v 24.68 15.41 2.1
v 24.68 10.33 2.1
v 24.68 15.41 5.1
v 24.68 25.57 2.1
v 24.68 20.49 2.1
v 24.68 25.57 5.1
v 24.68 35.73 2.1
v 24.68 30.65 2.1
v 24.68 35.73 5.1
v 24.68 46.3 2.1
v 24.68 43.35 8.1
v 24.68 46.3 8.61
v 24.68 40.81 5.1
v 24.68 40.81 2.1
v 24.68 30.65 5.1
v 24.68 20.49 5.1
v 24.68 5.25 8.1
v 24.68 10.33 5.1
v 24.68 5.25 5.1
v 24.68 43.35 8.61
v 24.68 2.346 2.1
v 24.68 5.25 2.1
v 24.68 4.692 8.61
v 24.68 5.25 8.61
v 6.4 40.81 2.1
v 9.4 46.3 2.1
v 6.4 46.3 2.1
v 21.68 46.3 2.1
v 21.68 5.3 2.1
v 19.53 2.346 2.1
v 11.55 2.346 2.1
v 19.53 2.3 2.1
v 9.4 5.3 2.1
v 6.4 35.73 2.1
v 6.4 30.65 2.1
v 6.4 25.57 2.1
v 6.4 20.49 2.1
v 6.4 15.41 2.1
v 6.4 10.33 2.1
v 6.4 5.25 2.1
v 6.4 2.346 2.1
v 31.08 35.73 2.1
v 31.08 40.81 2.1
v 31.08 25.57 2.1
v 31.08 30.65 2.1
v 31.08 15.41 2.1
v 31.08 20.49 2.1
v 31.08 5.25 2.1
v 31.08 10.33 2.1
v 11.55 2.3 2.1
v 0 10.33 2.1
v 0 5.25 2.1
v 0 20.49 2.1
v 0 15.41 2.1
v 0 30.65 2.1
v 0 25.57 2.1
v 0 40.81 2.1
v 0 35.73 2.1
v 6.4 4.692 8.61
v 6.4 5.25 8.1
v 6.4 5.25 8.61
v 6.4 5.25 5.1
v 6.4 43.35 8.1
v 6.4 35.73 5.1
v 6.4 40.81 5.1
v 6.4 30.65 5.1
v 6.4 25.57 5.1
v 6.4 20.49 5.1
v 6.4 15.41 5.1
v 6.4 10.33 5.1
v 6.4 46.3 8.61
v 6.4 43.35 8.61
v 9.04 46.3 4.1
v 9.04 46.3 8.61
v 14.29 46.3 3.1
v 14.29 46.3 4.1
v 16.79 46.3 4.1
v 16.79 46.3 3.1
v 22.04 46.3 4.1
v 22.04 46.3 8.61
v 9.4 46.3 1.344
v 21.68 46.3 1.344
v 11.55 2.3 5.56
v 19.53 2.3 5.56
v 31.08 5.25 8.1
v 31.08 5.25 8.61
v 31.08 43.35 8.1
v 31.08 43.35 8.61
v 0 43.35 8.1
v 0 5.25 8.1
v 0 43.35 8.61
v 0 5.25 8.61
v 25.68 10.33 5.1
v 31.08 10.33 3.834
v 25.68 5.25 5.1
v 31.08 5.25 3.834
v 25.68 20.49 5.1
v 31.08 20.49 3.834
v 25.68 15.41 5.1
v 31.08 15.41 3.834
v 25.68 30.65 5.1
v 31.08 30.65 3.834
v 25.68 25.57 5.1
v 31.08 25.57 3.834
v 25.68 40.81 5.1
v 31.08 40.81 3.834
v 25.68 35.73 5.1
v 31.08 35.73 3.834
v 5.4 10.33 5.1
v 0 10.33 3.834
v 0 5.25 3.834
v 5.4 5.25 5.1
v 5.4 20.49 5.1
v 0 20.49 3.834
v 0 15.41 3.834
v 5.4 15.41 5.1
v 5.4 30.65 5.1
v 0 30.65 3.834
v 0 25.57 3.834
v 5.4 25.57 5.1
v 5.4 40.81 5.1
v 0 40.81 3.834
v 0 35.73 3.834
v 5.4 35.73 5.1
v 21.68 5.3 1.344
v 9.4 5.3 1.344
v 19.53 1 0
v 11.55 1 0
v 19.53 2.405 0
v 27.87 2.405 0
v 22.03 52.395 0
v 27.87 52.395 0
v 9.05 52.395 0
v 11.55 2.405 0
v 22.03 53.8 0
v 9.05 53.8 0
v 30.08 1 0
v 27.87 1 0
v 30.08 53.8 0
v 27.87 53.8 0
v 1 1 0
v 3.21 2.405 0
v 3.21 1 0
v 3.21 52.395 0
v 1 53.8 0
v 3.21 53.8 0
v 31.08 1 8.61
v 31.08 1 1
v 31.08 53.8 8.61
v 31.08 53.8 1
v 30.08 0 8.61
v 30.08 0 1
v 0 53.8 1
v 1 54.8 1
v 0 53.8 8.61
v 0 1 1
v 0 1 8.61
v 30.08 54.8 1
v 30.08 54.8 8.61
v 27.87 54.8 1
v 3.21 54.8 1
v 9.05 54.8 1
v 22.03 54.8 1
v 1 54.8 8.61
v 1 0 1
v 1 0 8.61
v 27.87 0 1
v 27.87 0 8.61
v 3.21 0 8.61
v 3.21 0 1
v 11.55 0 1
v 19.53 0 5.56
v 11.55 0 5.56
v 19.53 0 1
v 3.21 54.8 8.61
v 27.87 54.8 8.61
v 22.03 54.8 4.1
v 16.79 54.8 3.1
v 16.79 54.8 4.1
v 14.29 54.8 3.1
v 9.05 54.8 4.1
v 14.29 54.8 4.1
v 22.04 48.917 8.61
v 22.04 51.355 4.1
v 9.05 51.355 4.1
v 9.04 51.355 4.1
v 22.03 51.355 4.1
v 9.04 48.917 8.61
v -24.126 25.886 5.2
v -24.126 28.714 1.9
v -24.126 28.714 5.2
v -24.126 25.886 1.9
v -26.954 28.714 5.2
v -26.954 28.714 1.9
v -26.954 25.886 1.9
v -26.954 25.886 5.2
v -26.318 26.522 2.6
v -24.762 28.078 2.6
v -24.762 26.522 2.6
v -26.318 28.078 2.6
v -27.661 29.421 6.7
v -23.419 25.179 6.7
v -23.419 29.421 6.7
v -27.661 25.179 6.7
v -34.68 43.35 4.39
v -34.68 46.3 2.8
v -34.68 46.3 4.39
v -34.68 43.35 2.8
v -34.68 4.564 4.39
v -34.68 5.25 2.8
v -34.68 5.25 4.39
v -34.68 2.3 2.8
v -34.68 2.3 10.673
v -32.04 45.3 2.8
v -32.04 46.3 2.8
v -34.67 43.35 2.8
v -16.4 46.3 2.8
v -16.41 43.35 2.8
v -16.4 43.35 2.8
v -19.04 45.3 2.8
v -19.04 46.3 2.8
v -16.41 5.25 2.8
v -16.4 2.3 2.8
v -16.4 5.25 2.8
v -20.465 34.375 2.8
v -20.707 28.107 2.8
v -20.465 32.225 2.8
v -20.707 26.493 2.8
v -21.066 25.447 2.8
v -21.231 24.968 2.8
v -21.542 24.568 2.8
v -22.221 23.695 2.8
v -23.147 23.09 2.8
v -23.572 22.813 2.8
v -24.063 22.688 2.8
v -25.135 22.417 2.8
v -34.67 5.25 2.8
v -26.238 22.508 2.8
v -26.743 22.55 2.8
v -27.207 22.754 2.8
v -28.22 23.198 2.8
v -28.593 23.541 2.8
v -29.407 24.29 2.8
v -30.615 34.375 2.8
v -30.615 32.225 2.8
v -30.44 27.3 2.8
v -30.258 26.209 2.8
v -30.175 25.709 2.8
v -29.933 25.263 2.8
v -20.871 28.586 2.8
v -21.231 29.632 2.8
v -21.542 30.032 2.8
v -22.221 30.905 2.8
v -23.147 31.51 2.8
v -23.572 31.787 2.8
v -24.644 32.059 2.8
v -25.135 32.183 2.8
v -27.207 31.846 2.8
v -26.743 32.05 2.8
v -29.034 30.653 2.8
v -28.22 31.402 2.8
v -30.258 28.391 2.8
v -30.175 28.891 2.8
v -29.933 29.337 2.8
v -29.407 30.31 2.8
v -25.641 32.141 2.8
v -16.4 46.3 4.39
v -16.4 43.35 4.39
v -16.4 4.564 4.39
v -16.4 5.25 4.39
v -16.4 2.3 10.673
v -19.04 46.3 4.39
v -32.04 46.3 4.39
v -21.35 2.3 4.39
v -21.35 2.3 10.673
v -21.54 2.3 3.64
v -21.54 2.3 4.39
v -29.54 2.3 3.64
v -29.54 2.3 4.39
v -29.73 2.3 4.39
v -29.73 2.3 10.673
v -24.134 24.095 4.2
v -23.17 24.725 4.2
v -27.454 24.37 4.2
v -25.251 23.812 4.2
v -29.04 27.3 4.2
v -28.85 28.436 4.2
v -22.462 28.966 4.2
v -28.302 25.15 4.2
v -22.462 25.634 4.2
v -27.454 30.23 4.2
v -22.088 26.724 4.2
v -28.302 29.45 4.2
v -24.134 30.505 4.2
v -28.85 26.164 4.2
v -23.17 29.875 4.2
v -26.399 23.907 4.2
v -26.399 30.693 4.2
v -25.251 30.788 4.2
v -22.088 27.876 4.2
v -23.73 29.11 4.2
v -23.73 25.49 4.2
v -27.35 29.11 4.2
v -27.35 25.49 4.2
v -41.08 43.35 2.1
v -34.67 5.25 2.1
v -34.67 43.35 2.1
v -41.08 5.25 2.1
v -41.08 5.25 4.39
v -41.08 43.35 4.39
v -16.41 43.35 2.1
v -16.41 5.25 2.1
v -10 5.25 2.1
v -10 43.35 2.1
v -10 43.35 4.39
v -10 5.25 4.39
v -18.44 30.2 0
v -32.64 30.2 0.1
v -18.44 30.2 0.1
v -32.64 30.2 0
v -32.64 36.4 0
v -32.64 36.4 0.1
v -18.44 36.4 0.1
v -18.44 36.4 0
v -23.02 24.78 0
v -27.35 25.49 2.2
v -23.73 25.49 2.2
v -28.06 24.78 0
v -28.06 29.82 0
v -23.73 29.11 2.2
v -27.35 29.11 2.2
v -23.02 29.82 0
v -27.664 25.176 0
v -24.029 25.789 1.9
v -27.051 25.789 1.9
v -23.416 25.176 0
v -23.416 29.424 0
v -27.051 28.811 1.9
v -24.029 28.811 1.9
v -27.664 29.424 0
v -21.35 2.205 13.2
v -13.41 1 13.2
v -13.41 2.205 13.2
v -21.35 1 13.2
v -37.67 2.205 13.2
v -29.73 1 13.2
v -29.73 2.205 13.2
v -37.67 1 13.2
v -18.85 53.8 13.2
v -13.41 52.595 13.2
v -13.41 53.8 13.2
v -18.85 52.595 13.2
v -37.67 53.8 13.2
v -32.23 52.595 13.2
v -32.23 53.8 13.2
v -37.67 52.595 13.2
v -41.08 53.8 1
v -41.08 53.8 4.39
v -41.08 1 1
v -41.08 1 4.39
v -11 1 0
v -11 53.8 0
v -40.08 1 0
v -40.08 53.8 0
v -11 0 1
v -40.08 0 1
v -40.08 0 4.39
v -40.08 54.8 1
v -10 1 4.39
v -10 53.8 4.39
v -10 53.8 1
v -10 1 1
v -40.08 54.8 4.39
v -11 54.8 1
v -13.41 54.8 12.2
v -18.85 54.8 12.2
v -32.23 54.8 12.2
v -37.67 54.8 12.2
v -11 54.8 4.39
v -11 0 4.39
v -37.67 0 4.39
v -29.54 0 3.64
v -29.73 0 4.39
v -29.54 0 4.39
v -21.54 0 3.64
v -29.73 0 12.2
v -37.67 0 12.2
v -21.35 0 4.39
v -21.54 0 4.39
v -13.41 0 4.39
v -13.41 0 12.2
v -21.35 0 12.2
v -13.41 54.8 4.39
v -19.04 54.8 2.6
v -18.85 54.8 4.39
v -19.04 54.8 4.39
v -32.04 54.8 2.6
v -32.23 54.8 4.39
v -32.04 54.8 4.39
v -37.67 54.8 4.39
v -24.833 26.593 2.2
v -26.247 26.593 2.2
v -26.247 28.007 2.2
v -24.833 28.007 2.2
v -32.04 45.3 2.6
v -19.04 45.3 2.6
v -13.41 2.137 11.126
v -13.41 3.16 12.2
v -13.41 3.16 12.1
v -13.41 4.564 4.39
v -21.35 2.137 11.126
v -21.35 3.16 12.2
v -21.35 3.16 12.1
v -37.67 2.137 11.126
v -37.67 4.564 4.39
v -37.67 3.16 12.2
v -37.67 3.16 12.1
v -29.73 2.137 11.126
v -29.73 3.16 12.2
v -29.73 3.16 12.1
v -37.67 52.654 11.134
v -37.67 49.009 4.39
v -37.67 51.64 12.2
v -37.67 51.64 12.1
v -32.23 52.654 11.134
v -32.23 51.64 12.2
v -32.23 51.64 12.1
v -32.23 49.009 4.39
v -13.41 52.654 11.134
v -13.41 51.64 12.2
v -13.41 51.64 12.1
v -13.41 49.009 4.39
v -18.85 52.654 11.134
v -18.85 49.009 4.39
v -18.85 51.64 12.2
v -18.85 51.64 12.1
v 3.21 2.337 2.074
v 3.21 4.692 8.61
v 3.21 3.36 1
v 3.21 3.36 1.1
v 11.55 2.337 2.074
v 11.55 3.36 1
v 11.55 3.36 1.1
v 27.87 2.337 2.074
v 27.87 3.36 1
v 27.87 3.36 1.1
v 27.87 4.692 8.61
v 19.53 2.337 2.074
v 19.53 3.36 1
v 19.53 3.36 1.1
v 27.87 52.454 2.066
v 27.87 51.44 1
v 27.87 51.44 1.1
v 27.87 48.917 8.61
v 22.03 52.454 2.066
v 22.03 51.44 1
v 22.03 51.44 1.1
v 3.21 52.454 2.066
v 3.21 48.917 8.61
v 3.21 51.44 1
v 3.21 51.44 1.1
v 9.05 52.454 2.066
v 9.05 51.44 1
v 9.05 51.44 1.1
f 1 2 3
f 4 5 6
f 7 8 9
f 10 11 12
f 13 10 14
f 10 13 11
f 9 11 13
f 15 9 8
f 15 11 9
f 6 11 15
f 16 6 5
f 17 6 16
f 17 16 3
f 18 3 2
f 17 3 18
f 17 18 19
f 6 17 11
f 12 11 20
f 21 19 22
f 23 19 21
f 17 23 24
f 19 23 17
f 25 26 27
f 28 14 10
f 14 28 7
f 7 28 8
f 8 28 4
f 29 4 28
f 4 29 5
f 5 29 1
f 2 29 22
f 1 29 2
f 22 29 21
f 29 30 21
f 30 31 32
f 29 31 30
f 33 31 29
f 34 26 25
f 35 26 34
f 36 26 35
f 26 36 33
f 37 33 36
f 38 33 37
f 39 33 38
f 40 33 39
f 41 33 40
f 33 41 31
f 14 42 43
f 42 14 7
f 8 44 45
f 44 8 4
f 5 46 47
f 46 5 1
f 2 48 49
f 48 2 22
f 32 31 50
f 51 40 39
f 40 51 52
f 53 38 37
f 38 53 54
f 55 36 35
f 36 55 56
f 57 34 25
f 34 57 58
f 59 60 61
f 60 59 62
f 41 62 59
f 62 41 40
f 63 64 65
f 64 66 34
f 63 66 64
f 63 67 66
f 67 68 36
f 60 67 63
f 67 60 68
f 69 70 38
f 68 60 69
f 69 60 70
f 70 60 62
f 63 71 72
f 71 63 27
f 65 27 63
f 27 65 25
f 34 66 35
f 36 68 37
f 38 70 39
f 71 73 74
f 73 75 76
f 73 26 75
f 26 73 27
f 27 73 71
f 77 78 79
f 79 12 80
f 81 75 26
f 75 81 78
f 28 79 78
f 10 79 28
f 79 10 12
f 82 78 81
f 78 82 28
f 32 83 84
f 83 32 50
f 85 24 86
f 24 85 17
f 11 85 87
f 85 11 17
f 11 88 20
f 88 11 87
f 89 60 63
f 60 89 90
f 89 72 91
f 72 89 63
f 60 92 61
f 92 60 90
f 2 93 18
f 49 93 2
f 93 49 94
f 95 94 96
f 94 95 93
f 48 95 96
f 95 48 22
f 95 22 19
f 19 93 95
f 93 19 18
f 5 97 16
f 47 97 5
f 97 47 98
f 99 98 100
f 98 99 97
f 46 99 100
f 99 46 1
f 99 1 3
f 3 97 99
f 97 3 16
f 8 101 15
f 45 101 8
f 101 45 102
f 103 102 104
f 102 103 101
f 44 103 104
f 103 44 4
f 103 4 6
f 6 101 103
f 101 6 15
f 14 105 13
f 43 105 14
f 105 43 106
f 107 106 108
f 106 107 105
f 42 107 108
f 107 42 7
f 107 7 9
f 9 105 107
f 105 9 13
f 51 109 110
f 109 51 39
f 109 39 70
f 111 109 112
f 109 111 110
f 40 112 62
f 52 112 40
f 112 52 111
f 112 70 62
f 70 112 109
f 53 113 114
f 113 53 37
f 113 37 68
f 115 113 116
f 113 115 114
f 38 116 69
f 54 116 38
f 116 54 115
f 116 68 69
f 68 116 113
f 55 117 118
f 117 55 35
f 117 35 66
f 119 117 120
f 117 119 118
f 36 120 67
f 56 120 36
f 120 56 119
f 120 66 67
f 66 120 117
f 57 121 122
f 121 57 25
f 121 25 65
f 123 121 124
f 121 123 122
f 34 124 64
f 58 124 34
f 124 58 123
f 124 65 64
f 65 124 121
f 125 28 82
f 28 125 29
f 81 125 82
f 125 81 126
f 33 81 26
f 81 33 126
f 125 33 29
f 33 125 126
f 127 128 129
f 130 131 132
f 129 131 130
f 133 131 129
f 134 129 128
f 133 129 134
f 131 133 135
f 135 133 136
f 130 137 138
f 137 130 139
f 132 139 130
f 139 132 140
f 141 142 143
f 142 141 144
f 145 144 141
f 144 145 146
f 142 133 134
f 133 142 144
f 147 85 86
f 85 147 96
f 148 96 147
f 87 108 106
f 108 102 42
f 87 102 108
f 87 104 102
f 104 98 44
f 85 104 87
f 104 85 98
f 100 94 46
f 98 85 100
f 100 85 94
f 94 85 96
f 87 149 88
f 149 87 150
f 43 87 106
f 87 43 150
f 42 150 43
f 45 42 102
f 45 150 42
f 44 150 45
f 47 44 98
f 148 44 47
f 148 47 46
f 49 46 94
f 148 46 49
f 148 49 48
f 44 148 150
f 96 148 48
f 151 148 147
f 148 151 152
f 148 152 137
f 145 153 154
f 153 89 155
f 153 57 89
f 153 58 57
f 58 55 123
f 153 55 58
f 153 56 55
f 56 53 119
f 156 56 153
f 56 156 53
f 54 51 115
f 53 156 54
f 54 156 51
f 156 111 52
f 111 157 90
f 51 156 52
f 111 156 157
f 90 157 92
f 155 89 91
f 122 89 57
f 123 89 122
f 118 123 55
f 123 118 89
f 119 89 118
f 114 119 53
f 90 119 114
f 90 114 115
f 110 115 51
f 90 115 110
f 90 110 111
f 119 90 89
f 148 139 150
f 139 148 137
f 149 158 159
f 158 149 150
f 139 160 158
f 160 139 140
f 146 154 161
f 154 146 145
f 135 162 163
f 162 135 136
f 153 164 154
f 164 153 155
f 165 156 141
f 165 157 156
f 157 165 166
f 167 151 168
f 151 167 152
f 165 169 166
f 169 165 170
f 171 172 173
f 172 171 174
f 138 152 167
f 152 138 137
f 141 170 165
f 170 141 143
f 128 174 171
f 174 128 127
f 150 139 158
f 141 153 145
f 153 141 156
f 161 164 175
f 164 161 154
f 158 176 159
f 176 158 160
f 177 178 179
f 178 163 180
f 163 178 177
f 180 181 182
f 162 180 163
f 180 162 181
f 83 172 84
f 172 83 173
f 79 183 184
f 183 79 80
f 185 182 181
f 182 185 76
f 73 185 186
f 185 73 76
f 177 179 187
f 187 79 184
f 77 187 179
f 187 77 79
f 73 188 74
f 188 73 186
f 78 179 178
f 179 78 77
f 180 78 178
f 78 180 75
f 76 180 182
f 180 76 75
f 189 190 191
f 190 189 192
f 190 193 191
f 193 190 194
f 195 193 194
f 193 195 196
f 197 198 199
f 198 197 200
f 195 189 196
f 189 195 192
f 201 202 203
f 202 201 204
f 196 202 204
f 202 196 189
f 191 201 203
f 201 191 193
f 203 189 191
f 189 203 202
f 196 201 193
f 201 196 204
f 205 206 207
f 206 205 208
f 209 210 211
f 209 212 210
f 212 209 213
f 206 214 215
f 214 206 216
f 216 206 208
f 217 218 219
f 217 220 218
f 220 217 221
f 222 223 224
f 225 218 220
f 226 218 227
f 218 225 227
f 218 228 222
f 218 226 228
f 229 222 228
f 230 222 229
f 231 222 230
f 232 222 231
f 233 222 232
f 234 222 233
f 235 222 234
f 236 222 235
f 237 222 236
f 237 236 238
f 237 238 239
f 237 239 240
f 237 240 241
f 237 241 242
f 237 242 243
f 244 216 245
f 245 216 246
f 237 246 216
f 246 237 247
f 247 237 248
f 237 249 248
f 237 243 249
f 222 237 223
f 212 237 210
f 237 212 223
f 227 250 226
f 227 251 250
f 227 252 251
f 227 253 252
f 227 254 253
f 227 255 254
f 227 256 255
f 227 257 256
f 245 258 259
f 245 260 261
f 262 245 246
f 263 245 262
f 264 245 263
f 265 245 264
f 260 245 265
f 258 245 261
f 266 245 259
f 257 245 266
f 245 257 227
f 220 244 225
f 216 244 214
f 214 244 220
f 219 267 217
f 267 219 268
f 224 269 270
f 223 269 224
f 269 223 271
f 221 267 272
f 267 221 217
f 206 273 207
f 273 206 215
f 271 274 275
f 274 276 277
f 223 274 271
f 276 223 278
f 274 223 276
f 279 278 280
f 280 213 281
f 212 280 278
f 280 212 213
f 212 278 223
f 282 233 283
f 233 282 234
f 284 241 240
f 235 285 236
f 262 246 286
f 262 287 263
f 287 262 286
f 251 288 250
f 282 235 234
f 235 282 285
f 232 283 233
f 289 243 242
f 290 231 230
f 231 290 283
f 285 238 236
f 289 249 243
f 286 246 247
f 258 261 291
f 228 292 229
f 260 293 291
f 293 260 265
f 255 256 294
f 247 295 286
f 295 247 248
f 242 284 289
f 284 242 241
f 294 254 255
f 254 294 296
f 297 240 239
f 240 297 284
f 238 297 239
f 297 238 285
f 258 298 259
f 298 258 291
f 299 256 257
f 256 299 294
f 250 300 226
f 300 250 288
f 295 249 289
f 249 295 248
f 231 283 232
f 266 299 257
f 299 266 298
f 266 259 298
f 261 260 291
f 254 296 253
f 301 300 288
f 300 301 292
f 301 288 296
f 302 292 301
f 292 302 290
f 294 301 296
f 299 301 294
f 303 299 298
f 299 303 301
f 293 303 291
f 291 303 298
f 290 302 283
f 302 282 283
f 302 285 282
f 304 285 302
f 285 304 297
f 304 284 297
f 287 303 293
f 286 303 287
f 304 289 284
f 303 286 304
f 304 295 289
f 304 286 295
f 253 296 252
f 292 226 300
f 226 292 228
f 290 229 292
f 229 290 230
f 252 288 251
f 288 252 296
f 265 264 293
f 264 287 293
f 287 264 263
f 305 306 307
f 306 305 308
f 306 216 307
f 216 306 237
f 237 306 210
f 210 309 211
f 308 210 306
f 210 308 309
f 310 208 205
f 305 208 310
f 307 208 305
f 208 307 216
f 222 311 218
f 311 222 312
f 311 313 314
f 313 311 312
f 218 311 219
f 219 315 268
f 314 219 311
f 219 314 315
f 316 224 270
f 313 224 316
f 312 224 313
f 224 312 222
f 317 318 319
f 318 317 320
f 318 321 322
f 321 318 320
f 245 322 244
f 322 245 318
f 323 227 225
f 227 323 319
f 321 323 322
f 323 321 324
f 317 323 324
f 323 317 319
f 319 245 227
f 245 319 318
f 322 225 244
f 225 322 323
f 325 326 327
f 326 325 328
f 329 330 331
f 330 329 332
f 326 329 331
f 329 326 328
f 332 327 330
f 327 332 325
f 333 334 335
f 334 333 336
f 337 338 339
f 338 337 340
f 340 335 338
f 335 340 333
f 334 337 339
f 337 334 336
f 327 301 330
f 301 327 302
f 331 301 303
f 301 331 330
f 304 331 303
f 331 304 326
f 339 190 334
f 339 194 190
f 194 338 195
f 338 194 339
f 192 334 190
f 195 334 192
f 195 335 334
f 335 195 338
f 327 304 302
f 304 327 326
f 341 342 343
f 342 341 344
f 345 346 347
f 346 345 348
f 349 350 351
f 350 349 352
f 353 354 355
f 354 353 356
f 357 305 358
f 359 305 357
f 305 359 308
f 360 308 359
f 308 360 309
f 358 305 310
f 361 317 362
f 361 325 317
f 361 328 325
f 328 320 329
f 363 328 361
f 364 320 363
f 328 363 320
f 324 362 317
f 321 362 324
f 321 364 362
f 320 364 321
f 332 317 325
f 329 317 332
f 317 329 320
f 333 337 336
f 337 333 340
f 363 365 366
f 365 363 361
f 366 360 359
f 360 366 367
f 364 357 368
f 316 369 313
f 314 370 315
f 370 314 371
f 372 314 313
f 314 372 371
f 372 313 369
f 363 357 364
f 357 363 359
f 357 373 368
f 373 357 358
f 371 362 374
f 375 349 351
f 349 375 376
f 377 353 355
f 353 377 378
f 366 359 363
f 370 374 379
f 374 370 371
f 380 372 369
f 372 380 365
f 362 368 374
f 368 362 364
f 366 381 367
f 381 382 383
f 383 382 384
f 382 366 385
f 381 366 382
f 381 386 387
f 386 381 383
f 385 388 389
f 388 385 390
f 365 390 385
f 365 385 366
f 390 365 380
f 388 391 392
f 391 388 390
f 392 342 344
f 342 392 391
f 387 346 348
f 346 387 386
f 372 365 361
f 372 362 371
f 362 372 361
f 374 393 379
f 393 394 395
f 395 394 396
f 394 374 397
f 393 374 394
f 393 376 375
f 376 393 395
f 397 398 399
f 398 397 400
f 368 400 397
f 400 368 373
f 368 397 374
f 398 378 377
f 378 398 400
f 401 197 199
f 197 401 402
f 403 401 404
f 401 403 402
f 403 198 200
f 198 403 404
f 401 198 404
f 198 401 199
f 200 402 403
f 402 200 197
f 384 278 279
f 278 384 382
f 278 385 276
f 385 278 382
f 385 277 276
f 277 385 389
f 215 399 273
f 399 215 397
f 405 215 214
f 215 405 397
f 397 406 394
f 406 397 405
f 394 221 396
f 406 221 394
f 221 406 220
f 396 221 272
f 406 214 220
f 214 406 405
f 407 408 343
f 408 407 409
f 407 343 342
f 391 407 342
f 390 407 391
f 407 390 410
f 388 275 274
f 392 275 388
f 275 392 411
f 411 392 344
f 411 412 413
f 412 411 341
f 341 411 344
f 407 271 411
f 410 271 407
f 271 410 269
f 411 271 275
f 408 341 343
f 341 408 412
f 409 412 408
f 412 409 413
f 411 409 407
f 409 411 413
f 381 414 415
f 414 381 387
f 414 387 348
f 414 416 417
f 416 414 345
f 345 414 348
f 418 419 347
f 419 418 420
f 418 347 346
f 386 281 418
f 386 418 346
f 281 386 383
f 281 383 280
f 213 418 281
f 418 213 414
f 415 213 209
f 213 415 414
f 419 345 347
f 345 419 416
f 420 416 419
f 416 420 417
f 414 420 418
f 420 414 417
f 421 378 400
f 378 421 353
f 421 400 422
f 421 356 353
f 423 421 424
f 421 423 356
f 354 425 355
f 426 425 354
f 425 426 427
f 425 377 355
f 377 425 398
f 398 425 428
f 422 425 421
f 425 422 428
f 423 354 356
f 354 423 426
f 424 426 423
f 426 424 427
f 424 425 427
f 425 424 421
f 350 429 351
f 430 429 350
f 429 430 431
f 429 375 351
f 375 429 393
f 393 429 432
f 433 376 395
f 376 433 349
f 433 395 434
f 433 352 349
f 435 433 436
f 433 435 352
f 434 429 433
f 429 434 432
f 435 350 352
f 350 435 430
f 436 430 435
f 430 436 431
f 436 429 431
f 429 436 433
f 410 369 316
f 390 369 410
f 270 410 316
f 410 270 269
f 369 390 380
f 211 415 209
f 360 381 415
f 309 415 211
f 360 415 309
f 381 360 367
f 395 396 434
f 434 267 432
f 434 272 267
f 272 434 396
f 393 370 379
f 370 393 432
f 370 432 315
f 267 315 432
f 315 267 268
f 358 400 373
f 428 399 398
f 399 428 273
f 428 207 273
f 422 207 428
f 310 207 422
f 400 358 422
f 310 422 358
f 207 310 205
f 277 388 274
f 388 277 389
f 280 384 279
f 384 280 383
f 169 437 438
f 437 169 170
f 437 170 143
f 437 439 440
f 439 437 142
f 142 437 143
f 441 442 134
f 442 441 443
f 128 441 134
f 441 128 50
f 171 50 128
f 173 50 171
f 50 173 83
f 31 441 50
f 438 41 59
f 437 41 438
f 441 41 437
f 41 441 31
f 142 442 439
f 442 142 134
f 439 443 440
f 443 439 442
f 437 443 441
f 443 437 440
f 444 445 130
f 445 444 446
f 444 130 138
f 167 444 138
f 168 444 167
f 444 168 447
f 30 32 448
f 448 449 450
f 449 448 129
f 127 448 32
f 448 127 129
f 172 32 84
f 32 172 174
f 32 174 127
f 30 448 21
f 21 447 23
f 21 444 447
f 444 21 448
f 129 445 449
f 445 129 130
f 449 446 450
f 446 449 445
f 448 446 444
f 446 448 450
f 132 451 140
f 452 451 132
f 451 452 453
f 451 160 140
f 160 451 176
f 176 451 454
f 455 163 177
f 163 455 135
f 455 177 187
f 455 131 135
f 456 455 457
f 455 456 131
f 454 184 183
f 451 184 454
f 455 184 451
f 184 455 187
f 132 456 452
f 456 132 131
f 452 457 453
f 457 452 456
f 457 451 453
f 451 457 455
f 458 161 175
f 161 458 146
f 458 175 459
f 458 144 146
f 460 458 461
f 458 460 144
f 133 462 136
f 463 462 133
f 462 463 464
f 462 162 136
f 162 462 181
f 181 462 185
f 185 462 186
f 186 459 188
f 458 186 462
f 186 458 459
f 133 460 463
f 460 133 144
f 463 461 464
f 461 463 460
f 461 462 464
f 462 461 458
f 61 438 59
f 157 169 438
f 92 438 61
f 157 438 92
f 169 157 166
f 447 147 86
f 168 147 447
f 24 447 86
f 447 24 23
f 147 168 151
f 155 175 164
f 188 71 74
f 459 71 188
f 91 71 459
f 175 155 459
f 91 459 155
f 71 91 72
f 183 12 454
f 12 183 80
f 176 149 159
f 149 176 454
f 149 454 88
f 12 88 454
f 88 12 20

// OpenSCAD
//////////////////////////////////////////////////////////////////////////////////////
///
///  Pin Protector Shell for Arduino Nano and compatibles
///
///  This project generated a shell around an Arduino Nano or Nano compatible
///  which protects all pins from being exposed to accidental shorting with tools
///  or other metallic objects on the work bench.
///
///  Right angle pin headers mounted on the upper side of the Nano PCB are used 
///  instead of the straight headers normally used. Two 15-pin single row and one
///  3x2-pin double row pin header arrays are needed.  This way, all connections
///  to he Nano are horizontal and are safely "hidden" between the upper and lower part
///  of the shell. 
///
///  The so covered horizontal pin connector increade the surface of the Nano shell,
///  so that there is enough space on the top shell for a sticker which identifies
///  each pin in a nicely readable size.
///
///  The top of the shell has a coutout for the 4 LEDs and has an integrated RESET
///  button which is printed in-situ and held in position by its waisted shape.
///
///  Given that there are several variants of the Nano design which essentially differ
///  slightly in the placement of the LEDs and the RESET button, so their longitudinal
///  position (measured in mm from the USB end of the PCB) is parametrized and can
///  easily adapted when needed. 
///
///  In addition to this SCAD file, there is also a corresponding PostScript file
///  which generates the labels to stick on the top part of the shell.
///  
//////////////////////////////////////////////////////////////////////////////////////
///
///  2015-06-13 Heinz Spiess, Switzerland
///
///  released under Creative Commons - Attribution - Share Alike licence (CC BY-SA)
//////////////////////////////////////////////////////////////////////////////////////

ew = 0.56;
eh = 0.252;

module chamfered_cube(size,d=1){
   hull(){
     translate([d,d,0])cube(size-2*[d,d,0]);
     translate([0,d,d])cube(size-2*[0,d,d]);
     translate([d,0,d])cube(size-2*[d,0,d]);
   }
}


// build a cylinder with chamfered edges
module chamfered_cylinder(r=0,r1=0,r2=0,h=0,d=1){
   hull(){
      translate([0,0,d])cylinder(r1=(r?r:r1),r2=(r>0?r:r2),h=h-2*d);
      cylinder(r1=(r?r:r1)-d,r2=(r>0?r:r2)-d,h=h);
   }
}


module nanoshell(
   W = .7*25.4+0.5,
   L = 44,
   H1 = 6,
   H2 = 3,
   pins = 15,
   wall = [6.4,2.3,2.1],
   all = false,
   ledx = 10, 
   ledy = 30,
   resety = 25,
   resetz = 4.5,
   resetr = 2,
   upper = false,
   lower = false,
   case = false,
   move = true,
   airflow = true,
   eps = -0.2,
){
   usb = [8,9,4];
   isp = [13,8.5,6.5];
   ispk = [2.5,8,7.5];
   Wo = 2*wall[0]+W;
   Ho = 2*wall[2]+H1+H2;
   Lo = wall[1]+L+isp[1];

module case(){
   // reset knob
   translate([Wo/2,wall[1]+resety,Ho-wall[2]-resetz-0.1])rotate(45){
           cylinder(r=resetr,h=2+wall[2],$fn=4);
           cylinder(r2=resetr,r1=resetr+1,h=resetz-1-2,$fn=4);
   }
   difference(){
     // main body
     chamfered_cube([2*wall[0]+W,wall[1]+L+isp[1],2*wall[2]+H1+H2]);
     translate([Wo/2,wall[1]+resety,Ho-wall[2]-2-0.1])rotate(45){
           cylinder(r1=1.5,h=2,$fn=4);
     }
     // main cutout
     difference(){
         translate(wall) cube([W,L,Ho-2*wall[2]-0.7]);
         translate([Wo/2,wall[1]+resety,Ho-wall[2]-2-0.1])
	    cylinder(r1=3.5,r2=6,h=2.5);
     }
     // pin cutout
     translate([Wo/2,0,0])for(sx=[-1,1])scale([sx,1,1])
        translate([-Wo/2-1, wall[1]+L/2-pins/2*2.54,wall[2]+H1])
           cube([wall[0]+1.01,pins*2.54,H2]);

     // lower air flow cutout
     if(airflow){
        // air flow side windows
        translate([Wo/2,0,0])for(sx=[-1,1])scale([sx,1,1])
	   for(p=[0:4:pins-3])
              translate([-Wo/2-1, wall[1]+L/2-(pins/2-p)*2.54,wall[2]])
	         hull(){
                   cube([1,2*2.54,H2/2]);
                   translate([wall[0],0,0])cube([1.01,2*2.54,H2]);
		 }
        // base plate deepening
        translate([wall[0]+3,wall[1]+3,wall[2]-3*eh]) cube([W-6,L-3,wall[2]]);
     } 
     // mini USB cutout
     translate([wall[0]+W/2-usb[0]/2,-1,wall[2]+H1-2.54])
        cube(usb);
     // 3x2pin ISP header main cutout
     translate([wall[0]+W/2-isp[0]/2,wall[1]+L-1,wall[2]+H1-4])
        cube(isp+[0,2,0]);
     // 3x2pin ISP header key cutout
     translate([wall[0]+W/2-ispk[0]/2,wall[1]+L-1,wall[2]+H1-3-2])
        cube(ispk+[0,2,0]);
     // LED cutout
     translate([Wo/2-ledx/2,wall[1]+ledy,Ho-wall[2]-0.1-0.7]){
        translate([0,0,-H1/2])cube([ledx,2,wall[2]+H1/2]);
        hull(){
           cube([ledx,2,.1]);
           translate([-wall[2],-wall[2],wall[2]+0.7])cube([ledx+2*wall[2],2+2*wall[2],.2]);
        }
     }
     // Reset knob
     translate([Wo/2,wall[1]+resety,Ho-wall[2]-0.1])rotate(45){
        difference(){
           cylinder(r1=resetr+ew,r2=resetr+wall[2]/2+ew,h=wall[2]+0.2,$fn=4);
           cylinder(r1=resetr,r2=resetr+wall[2]/2,h=wall[2]+0.2,$fn=4);
	}
     }
     translate([Wo/2,wall[1]+resety,Ho-wall[2]-2-0.1])rotate(45){
        difference(){
           cylinder(r=resetr+ew,h=wall[2]+0.2,$fn=4);
           cylinder(r=resetr,h=wall[2]+0.2,$fn=4);
	}
     }
   }
}

module cuthalf(gap=0){
   difference(){
      // main lower half
      translate([-1,-1,-1]) cube([Wo+2,Lo+2,wall[2]+H1+1.51-gap]);
      // reset knob
      translate([Wo/2,wall[1]+resety,wall[2]+0.1])
         cylinder(r=5,h=Ho-wall[2]-0.11);
      // clips on USB side
      translate([Wo/2,0,0])for(sx=[-1,1])scale([sx,1,1]){
         translate([usb[0]/2-0.01-gap,-1,-0.1]){
	    cube([Wo/2-usb[0]/2-wall[0]/2+2*gap,wall[1]+1.01+gap,Ho+2]);
            hull(){
	       translate([0,0,wall[2]])
                  cube([Wo/2-usb[0]/2-wall[0]/2+2*gap,wall[1]+1.01+gap,Ho-wall[2]]);
               translate([0,0,Ho])
	          cube([Wo/2-usb[0]/2-wall[0]/2+2*gap,wall[1]+5.01+gap,1]);
            }
	    hull(){
	       cube([Wo/2-usb[0]/2-wall[0]/2+2*gap,wall[1]+1.01+gap,wall[2]+0.1]);
	       translate([0,0,0.1+wall[2]/2-0.05])
	       cube([Wo/2-usb[0]/2-wall[0]/2+2*gap,wall[1]+1.01+wall[2]/2+gap,0.1]);
	    }
         }
      }
      // clips on ISP side
      translate([Wo/2,Lo,0])rotate(180)for(sx=[-1,1])scale([sx,1,1]){
         translate([isp[0]/2-0.01-gap,-1,-0.1]){
	    cube([Wo/2-isp[0]/2-wall[0]/2+2*gap,wall[1]+1.01+gap,Ho+2]);
            hull(){
	       translate([0,0,wall[2]])
                  cube([Wo/2-isp[0]/2-wall[0]/2+2*gap,wall[1]+1.01+gap,Ho-wall[2]]);
               translate([0,0,Ho])
	          cube([Wo/2-isp[0]/2-wall[0]/2+2*gap,wall[1]+7.01+gap,1]);
            }
	    hull(){
	       cube([Wo/2-isp[0]/2-wall[0]/2+2*gap,wall[1]+1.01+gap,wall[2]+0.1]);
	       translate([0,0,0.1+wall[2]/2-0.05])
	       cube([Wo/2-isp[0]/2-wall[0]/2+2*gap,wall[1]+1.01+wall[2]/2+gap,0.1]);
	    }
         }
      }
   }

}

module lower(eps=0){
   intersection(){
      case();
      cuthalf(gap=eps);
   }
}

module upper(eps=0){
   translate([0,0,move?Ho:0])rotate([0,move?180:0,0])difference(){
      case();
      cuthalf(gap=eps);
   }
}
     if(case){
        lower(eps=0);
        upper(eps=eps);
     }
     if(lower) lower(eps=0);
     if(upper) upper(eps=eps);
}

module NanoShellR25L30(){ // AUTO_MAKE_STL
   translate([-3,0,0])nanoshell(upper=true,eps=-0.2,resety=25,ledy=30,airflow=false);
   nanoshell(lower=true,resety=25,ledy=30,airflow=false);
}

module NanoShellR24L29(){ // AUTO_MAKE_STL
   translate([-3,0,0])nanoshell(upper=true,eps=-0.2,resety=24,ledy=29,airflow=false);
   nanoshell(lower=true,resety=24,ledy=29,airflow=false);
}

module NanoShellR26L32(){ // AUTO_MAKE_STL
   translate([-3,0,0])nanoshell(upper=true,eps=-0.2,resety=26,ledy=32,airflow=false);
   nanoshell(lower=true,resety=26,ledy=32,airflow=false);
}

module NanoShellR27L33(){ // AUTO_MAKE_STL
   translate([-3,0,0])nanoshell(upper=true,eps=-0.2,resety=27,ledy=33,airflow=false);
   nanoshell(lower=true,resety=27,ledy=33,airflow=false);
}

module NanoShellR25L30af(){ // AUTO_MAKE_STL
   translate([-3,0,0])nanoshell(upper=true,eps=-0.2,resety=25,ledy=30);
   nanoshell(lower=true,resety=25,ledy=30);
}

module NanoShellR24L29af(){ // AUTO_MAKE_STL
   translate([-3,0,0])nanoshell(upper=true,eps=-0.2,resety=24,ledy=29);
   nanoshell(lower=true,resety=24,ledy=29);
}

module NanoShellR26L32af(){ // AUTO_MAKE_STL
   translate([-3,0,0])nanoshell(upper=true,eps=-0.2,resety=26,ledy=32);
   nanoshell(lower=true,resety=26,ledy=32);
}

module NanoShellR27L33af(){ // AUTO_MAKE_STL
   translate([-3,0,0])nanoshell(upper=true,eps=-0.2,resety=27,ledy=33);
   nanoshell(lower=true,resety=27,ledy=33);
}

translate([-10,0,0])nanoshell(upper=true,eps=-0.2);
//nanoshell(upper=true,move=false,eps=-0.2);
nanoshell(lower=true);
